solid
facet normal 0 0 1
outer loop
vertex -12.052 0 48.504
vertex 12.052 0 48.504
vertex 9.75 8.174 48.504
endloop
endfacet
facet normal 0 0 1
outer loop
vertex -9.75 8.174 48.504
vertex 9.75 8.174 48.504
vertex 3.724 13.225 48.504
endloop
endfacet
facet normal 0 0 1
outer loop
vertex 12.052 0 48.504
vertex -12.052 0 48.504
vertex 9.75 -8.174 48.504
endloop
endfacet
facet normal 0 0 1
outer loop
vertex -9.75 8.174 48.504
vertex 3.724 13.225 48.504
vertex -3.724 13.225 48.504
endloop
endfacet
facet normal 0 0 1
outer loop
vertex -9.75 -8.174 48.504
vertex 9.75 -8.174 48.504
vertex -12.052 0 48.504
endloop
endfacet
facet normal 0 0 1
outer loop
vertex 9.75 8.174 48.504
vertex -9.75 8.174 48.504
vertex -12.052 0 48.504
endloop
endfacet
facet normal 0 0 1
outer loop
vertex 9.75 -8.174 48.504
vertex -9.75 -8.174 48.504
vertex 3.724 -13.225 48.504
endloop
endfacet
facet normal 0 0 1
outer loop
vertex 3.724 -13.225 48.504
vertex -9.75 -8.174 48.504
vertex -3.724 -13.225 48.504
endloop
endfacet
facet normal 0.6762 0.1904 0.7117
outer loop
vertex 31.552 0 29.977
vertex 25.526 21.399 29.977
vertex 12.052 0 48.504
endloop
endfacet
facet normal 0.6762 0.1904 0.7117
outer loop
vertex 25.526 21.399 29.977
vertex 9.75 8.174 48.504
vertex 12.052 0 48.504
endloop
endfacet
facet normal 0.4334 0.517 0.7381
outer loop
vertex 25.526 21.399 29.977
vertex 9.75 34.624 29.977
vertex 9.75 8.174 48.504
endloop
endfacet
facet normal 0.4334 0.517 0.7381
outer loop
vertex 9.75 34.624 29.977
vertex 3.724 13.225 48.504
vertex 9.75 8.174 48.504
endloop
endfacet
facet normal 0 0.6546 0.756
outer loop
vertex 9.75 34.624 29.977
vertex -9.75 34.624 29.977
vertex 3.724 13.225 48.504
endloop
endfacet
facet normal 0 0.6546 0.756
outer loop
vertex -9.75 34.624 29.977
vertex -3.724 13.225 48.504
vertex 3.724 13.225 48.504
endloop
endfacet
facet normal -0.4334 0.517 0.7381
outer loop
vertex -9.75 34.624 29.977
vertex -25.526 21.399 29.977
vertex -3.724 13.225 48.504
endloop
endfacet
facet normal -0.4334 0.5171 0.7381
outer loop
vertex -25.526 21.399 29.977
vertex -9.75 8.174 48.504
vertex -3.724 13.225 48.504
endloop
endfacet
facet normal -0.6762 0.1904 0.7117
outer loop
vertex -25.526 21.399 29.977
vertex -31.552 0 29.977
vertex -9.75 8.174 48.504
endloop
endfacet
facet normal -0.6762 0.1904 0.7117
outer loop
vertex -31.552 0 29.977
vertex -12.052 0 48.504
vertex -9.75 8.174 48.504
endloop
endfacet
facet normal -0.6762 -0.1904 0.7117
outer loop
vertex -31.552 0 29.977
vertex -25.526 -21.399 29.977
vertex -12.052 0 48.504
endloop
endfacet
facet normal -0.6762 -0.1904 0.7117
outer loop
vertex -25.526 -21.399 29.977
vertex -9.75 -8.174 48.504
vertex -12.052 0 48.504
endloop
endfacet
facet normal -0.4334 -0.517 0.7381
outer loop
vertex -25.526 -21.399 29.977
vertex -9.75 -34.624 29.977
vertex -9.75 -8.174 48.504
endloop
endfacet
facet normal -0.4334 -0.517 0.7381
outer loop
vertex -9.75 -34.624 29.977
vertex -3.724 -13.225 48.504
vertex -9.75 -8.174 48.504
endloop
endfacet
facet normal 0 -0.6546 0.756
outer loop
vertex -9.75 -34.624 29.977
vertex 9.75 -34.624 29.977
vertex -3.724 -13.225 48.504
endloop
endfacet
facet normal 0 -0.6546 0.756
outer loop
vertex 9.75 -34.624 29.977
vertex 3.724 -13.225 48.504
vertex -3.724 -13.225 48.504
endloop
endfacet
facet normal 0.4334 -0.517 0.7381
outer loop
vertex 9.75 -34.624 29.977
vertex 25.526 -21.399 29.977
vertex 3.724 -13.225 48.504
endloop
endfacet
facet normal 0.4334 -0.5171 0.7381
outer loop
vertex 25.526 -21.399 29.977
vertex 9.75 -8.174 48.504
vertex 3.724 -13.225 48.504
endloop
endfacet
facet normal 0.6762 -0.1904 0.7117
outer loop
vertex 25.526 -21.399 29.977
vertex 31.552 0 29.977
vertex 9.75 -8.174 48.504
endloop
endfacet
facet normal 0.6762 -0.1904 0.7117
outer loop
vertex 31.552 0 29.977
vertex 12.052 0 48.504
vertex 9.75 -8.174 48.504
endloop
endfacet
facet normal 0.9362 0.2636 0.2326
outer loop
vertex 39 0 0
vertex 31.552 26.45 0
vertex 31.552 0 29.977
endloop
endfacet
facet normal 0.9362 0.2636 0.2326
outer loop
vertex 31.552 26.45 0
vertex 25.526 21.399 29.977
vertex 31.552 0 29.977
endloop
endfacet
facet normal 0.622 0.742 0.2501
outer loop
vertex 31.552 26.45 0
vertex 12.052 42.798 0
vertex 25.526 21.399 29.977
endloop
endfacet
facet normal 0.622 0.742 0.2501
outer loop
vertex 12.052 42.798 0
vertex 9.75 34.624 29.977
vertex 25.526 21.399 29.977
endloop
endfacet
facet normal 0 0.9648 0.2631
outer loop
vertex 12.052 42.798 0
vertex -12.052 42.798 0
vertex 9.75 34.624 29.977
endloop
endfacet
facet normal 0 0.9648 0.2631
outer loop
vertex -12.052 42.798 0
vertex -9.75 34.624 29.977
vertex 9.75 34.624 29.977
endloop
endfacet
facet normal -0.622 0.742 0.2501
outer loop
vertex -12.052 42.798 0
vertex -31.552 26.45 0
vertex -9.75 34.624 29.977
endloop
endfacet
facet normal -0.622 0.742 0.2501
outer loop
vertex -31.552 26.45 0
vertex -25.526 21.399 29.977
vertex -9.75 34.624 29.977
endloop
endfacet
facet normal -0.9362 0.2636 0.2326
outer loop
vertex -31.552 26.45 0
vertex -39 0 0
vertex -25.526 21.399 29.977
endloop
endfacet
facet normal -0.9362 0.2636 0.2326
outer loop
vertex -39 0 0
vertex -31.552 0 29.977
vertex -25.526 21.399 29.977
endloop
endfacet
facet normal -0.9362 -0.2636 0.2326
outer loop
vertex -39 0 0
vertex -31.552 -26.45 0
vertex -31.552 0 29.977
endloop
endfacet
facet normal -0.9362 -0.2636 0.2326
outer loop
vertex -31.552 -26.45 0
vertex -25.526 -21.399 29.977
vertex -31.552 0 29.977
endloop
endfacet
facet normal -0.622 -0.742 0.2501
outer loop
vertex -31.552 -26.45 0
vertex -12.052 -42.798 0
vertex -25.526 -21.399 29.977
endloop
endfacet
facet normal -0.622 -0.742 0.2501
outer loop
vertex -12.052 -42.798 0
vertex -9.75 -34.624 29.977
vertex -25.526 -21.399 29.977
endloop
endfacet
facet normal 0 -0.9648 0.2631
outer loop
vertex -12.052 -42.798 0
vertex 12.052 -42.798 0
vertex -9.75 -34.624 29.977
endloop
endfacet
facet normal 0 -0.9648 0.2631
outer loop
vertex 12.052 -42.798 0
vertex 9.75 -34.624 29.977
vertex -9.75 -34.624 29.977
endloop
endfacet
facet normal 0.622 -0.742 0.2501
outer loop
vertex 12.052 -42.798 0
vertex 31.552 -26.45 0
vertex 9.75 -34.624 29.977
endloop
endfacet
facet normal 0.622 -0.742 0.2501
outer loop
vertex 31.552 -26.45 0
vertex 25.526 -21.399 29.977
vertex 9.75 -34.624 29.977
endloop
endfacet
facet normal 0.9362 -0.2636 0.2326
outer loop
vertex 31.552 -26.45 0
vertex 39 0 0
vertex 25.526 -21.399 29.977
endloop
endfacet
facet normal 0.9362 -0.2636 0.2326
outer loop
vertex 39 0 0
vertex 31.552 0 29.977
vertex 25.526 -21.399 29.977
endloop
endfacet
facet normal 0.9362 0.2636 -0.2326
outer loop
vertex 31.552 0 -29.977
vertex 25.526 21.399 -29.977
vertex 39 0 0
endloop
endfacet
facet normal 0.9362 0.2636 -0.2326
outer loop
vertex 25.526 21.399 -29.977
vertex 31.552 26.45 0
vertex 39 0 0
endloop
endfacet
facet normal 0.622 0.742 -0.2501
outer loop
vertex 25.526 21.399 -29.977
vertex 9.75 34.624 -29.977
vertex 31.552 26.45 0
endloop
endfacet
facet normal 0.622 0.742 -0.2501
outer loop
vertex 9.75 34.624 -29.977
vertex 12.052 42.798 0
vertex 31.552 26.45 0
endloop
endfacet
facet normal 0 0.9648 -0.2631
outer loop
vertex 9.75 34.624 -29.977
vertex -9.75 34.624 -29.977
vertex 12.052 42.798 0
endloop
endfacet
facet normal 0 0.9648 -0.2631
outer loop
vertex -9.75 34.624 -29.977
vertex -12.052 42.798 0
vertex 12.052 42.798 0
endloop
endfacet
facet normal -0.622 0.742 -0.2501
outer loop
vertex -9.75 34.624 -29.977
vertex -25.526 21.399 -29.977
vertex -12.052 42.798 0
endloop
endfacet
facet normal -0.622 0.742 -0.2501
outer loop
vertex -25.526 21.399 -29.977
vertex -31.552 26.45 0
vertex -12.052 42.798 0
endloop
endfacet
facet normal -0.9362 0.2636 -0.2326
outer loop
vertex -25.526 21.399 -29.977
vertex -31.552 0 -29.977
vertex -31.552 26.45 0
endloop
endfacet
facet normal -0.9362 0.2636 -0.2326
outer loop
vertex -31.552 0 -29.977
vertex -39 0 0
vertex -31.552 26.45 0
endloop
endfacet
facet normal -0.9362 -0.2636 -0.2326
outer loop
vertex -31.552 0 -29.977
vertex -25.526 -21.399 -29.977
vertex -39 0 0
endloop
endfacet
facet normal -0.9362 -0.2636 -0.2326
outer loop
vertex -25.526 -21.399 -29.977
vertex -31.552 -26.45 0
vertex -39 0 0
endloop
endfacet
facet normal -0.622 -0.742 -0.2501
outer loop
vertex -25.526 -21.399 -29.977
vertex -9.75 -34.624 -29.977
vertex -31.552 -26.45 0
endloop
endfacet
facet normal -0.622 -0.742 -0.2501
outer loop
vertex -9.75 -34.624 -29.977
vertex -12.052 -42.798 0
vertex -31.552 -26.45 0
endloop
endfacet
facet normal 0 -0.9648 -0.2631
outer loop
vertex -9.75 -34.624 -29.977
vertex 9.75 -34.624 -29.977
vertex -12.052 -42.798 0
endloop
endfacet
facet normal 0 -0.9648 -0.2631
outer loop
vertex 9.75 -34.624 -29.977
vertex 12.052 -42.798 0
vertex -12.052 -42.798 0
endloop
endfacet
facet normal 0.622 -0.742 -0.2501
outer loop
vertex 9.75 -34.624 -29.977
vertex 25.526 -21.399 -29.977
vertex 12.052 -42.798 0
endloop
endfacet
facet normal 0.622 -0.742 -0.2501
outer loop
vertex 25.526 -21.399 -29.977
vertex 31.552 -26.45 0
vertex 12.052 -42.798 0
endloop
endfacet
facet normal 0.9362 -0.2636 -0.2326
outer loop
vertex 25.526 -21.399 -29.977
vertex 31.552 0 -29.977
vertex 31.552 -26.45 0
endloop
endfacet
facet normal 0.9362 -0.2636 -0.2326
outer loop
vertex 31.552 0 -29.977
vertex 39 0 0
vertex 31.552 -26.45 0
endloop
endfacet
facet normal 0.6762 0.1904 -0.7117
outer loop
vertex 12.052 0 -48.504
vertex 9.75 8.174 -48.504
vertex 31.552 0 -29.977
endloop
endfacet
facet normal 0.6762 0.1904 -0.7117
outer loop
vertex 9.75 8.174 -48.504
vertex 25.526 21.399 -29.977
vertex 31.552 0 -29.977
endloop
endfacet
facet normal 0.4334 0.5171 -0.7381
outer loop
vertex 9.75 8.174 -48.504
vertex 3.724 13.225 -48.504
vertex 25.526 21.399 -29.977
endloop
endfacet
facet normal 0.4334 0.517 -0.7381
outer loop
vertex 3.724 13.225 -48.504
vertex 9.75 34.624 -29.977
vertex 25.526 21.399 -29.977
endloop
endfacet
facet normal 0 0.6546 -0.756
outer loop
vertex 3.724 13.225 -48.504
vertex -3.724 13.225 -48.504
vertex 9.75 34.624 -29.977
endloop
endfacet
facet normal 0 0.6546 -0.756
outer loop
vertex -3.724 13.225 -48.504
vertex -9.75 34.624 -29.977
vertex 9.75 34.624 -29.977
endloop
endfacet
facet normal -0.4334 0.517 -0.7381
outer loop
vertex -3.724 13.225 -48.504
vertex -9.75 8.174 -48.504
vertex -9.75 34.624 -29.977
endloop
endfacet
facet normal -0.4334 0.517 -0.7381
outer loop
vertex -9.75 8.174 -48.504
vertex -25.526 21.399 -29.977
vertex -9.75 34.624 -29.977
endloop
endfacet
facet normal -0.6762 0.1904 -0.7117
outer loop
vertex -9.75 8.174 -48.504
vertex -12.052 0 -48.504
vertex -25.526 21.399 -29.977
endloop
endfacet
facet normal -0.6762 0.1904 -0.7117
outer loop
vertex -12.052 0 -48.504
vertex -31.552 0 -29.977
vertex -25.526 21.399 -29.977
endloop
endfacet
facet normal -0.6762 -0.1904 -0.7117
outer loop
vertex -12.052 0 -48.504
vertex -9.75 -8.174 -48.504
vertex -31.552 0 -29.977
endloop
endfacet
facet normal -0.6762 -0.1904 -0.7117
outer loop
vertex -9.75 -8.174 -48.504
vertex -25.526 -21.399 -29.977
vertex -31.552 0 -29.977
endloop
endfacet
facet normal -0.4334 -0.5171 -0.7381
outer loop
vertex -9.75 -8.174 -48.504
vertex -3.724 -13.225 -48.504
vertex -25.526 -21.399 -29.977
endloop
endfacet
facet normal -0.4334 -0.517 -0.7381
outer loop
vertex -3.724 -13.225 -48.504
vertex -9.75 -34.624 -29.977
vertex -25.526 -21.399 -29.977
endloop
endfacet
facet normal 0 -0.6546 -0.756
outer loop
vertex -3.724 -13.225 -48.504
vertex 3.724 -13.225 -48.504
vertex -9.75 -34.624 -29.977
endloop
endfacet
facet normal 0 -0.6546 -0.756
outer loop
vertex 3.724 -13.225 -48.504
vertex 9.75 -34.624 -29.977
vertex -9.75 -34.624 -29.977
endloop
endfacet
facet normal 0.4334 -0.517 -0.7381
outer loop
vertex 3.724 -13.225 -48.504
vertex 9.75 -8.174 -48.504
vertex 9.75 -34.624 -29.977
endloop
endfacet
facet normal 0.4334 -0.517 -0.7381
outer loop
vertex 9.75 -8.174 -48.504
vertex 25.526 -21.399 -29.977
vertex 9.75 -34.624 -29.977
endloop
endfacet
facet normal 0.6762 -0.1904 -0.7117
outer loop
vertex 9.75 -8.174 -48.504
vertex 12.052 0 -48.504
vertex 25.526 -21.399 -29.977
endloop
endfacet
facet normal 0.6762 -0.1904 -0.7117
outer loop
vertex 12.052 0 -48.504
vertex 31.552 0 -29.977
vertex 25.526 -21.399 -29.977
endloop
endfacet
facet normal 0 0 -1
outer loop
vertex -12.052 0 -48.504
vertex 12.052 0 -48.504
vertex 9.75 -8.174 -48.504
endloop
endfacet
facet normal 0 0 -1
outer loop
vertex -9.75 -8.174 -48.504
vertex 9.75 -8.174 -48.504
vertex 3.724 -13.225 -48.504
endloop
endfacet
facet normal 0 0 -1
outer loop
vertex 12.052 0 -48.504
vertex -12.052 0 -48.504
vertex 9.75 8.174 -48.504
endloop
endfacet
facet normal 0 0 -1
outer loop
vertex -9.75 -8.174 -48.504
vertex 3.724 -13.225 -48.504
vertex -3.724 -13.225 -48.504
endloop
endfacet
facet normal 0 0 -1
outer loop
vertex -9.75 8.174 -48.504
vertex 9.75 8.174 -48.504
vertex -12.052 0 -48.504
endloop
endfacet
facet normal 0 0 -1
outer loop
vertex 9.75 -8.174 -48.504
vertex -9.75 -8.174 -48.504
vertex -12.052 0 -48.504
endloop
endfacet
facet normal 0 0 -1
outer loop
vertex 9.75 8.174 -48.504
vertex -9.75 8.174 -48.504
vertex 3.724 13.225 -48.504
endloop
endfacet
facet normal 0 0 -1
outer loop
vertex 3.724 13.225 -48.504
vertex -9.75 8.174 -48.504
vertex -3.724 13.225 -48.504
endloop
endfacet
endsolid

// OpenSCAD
// Generated by SolidPython 1.0.1 on 2020-07-29 00:46:51


scale(v = [13, 15, 17]) {
	sphere(r = 3);
}
/***********************************************
*********      SolidPython code:      **********
************************************************
 
# import packages: SolidPython
from solid import *
from solid.utils import *
from itertools import chain, combinations, permutations


class Resize:

    def __init__(self, scad_file):
        self.scad_file = scad_file
        #self.scad_file = import_scad(scad_file)
        # cone/cylinder param:
        self.r1 = 0
        self.r2 = 0
        self.h = 0
        # rectangular prism param:
        self.w = 0
        self.l = 0
        # ellipse param:
        self.r = 0

    # import OpenScad code (file name corresponds to shape)


    # classify shape + parameters
    def assign(self, param1, param2, param3):
        if self.scad_file == 'cone.scad':
            self.r1 = param1
            self.r2 = param2
            self.h = param3
        elif self.scad_file == 'cylinder.scad':
            self.r1 = param1
            self.r2 = param2
            self.h = param3
        elif self.scad_file == 'rectangularPrism.scad':
            self.h = param1
            self.l = param2
            self.w = param3
        else:
            self.r = param1
            self.h = param2

    # resize parameters
    def iterate(self):
        x = range(3, 20, 2)
        i = 1
        if self.scad_file == 'cone.scad':
            tempList = list(permutations(x, 2))
            for temp in tempList:
                param1 = temp[0]
                param2 = temp[1]
                filepath = 'produced_scad_files/' + 'cone' + str(param1) + '_' + str(param2) + '_' + '.scad'
                scad_render_to_file(cylinder(h=param1, r1=param2, r2=0), filepath)

        elif self.scad_file == 'cylinder.scad':
            tempList = list(permutations(x, 3))
            for temp in tempList:
                param1 = temp[0]
                param2 = temp[1]
                filepath = 'produced_scad_files/' + 'cylinder' + str(param1) + '_' + str(param2) + '_' + '.scad'
                scad_render_to_file(cylinder(h=param1, r1=param2, r2=param2), filepath)

        elif self.scad_file == 'rectangularPrism.scad':
            tempList = list(permutations(x, 3))
            for temp in tempList:
                param1 = temp[0]
                param2 = temp[1]
                param3 = temp[2]
                filepath = 'produced_scad_files/' + 'rectangularPrism' + str(param1) + '_' + str(param2) + '_' + str(
                    param3) + '.scad'
                scad_render_to_file(cube(size=(param1, param2, param3)), filepath)

        elif self.scad_file == 'ellipse.scad':
            tempList = list(permutations(x, 4))
            for temp in tempList:
                param1 = temp[0]
                param2 = temp[1]
                param3 = temp[2]
                param4 = temp[3]
                filepath = 'produced_scad_files/' + 'ellipse' + str(param1) + '_' + str(param2) + '_' + str(param3) + '_' + str(param4) + '.scad'
                scad_render_to_file(scale([param1, param2, param3])(sphere(r=param4)), filepath)

    def render_to_scadfile(self):
        scad_render_to_file(scad, 'example.scad') 
 
************************************************/
